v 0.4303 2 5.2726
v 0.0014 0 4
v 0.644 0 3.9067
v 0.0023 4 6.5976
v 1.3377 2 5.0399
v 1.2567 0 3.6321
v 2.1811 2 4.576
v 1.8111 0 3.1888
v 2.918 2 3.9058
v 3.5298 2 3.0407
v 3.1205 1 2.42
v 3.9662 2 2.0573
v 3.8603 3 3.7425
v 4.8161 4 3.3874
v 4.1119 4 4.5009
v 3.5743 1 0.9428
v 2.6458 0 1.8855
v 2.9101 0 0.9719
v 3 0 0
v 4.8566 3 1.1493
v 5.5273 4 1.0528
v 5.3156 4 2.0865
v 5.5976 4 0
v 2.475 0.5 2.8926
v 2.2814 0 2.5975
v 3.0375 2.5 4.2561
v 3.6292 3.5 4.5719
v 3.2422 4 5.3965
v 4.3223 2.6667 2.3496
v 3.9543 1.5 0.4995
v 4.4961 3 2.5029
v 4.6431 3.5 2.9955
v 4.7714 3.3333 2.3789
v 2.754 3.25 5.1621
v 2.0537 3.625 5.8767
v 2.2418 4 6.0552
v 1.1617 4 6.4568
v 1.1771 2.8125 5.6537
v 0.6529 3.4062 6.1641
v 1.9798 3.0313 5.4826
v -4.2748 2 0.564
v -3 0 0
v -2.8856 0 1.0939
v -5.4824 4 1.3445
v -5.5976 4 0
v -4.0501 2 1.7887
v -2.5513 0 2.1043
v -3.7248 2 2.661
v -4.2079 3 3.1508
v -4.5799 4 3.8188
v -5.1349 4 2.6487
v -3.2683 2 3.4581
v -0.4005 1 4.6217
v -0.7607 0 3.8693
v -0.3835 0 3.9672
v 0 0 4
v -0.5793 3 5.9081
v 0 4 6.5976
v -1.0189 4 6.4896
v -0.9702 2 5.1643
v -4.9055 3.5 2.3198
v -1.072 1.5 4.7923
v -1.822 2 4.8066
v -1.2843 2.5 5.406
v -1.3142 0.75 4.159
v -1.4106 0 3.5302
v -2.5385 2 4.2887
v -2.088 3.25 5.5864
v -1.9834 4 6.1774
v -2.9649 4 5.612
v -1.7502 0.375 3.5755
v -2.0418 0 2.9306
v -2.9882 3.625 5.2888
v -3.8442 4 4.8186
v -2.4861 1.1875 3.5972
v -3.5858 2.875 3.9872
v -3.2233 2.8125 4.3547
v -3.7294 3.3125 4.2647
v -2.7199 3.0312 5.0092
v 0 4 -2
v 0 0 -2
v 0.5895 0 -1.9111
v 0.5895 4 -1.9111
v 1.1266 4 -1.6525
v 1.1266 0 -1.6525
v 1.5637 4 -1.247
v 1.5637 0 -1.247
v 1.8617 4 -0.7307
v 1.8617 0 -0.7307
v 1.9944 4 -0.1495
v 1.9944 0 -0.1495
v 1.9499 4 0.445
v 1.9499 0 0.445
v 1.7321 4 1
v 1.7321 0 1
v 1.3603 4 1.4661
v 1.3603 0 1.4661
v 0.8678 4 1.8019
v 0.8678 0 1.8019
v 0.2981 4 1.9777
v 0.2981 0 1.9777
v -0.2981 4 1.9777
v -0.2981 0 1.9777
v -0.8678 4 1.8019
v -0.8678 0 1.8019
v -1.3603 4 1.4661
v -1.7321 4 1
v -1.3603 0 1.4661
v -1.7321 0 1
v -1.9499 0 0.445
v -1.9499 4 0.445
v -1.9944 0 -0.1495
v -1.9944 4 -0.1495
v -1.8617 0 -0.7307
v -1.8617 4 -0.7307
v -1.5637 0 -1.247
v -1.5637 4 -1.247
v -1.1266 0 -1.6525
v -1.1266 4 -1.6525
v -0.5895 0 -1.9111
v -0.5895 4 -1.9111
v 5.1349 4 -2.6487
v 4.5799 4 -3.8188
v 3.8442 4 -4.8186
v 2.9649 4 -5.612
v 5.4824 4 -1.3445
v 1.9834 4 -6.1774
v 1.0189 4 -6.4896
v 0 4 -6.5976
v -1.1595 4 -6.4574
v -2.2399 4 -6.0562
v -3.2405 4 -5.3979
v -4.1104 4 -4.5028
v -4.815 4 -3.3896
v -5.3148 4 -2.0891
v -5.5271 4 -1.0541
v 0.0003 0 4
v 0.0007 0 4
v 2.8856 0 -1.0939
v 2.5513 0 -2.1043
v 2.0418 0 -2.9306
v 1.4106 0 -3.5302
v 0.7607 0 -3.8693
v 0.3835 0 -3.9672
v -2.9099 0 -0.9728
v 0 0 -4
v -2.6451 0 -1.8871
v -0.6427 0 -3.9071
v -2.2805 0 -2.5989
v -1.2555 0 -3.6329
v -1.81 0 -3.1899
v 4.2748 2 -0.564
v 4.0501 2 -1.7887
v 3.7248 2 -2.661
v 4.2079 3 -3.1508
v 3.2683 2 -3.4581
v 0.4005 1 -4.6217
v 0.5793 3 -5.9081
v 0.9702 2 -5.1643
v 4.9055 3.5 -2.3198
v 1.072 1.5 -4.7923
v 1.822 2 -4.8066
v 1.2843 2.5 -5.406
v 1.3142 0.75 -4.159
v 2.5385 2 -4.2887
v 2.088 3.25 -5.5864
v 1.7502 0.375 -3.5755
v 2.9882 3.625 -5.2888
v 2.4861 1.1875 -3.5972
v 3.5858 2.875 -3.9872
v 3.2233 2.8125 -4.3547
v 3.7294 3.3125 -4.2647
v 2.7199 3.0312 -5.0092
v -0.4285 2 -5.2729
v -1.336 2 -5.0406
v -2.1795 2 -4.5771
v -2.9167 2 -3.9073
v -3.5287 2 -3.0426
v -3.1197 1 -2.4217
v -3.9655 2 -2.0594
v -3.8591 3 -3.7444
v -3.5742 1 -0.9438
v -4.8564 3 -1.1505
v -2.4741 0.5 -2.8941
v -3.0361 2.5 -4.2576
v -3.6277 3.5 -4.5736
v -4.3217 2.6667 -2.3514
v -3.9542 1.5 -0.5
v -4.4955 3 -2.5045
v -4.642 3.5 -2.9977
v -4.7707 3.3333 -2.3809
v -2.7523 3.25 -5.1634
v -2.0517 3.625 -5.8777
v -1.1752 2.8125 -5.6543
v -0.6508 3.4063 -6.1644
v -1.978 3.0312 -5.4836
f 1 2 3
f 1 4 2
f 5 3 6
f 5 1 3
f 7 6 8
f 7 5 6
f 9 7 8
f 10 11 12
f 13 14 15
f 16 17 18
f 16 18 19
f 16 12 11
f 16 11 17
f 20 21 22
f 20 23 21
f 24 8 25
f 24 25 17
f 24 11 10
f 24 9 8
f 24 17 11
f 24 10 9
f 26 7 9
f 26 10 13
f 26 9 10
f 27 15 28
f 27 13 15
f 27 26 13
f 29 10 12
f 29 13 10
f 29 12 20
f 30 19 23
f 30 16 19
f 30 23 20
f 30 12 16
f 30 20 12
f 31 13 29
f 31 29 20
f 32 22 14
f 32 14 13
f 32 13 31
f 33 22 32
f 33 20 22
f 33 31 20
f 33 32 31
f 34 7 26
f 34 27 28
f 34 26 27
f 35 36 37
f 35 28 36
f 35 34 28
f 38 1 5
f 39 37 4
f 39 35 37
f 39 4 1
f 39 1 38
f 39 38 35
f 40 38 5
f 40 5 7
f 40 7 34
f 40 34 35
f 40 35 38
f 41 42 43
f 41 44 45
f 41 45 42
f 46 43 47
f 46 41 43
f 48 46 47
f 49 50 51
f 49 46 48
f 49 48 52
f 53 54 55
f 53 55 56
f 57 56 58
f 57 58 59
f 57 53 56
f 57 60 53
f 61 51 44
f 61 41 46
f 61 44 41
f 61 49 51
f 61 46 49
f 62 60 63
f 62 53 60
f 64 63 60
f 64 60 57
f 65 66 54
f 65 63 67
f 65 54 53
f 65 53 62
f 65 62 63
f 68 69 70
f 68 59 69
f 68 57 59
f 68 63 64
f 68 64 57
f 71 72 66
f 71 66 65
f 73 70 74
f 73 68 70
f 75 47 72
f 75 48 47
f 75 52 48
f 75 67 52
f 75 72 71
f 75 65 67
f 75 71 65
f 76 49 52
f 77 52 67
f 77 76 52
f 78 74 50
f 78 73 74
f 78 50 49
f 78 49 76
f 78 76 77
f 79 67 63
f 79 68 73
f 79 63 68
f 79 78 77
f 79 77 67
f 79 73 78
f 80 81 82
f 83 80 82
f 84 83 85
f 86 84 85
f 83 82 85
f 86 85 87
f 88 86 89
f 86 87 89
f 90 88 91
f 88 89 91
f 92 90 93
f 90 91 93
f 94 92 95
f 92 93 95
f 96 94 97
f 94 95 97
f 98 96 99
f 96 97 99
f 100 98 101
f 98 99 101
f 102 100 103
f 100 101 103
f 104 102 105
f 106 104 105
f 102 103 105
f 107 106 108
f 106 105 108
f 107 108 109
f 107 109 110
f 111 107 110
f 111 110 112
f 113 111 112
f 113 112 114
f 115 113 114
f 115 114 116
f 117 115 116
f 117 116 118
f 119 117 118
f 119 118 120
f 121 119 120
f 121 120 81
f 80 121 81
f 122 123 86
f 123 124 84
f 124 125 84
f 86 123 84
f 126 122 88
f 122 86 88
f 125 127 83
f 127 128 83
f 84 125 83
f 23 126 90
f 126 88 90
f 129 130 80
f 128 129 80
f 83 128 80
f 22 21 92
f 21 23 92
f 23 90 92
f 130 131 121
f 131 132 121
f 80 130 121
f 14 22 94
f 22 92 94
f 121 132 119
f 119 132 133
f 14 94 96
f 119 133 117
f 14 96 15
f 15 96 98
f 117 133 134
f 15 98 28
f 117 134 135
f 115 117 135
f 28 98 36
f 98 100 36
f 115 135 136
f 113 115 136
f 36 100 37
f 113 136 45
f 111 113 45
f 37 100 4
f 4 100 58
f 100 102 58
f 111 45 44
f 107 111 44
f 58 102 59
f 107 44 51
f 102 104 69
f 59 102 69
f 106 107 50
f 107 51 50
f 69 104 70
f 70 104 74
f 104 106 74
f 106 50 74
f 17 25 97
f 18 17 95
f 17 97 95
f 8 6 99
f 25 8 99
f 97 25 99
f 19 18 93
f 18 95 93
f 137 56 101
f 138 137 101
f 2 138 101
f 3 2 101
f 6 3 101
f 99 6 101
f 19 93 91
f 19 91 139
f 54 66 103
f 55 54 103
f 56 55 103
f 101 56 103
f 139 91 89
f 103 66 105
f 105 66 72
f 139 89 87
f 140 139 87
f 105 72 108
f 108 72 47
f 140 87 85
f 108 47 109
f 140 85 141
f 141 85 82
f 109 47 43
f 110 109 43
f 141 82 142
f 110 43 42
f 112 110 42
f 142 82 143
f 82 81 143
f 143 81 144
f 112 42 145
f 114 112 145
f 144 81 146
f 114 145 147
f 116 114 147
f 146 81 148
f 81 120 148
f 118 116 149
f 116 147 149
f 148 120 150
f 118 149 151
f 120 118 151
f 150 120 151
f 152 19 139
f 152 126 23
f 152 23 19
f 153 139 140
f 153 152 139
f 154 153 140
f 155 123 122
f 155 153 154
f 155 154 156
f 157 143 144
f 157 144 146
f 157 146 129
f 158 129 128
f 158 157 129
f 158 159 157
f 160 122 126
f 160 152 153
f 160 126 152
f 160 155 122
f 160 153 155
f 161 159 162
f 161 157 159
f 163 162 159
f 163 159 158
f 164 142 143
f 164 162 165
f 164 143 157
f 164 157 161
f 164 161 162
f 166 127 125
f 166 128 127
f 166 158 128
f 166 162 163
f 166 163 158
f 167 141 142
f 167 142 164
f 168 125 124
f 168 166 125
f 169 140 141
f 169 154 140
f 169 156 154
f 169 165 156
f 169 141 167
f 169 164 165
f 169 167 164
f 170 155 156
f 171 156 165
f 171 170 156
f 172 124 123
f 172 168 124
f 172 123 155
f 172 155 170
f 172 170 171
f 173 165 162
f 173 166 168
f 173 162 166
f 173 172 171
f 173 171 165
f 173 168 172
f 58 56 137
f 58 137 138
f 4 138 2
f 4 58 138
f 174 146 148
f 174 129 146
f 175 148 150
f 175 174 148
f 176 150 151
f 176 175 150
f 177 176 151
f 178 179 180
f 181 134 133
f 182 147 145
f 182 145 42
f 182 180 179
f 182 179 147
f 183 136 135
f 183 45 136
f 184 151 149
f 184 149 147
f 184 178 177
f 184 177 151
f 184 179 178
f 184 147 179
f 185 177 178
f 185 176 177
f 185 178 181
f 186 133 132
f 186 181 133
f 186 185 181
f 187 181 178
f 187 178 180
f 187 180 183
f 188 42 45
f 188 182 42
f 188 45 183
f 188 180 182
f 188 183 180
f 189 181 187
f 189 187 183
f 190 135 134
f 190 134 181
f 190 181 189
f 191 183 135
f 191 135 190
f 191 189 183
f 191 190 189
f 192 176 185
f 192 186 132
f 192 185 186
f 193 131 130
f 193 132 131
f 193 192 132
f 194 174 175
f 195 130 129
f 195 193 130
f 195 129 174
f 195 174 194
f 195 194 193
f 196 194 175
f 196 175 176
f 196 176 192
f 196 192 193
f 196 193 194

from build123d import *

# Parameters (mm, degrees)
SKETCH1_RX          = 4
SKETCH1_RY          = 3
BOSS_EXTRUDE1_DEPTH = 4
BOSS_EXTRUDE1_TAPER = -33
SKETCH2_R           = 2
CUT_EXTRUDE1_DEPTH  = 10


with BuildPart() as part:
    # Sketch1 → Boss-Extrude1 (new body)
    with BuildSketch(Plane(origin=(0, 0, 0), x_dir=(1, 0, 0), z_dir=(0, 1, 0))):
        with Locations(Location((0, 0), (0, 0, 90))):
            Ellipse(SKETCH1_RX, SKETCH1_RY)
    extrude(amount=BOSS_EXTRUDE1_DEPTH, taper=BOSS_EXTRUDE1_TAPER)

    # Sketch2 → Cut-Extrude1 (cut)
    with BuildSketch(Plane.XZ):
        with Locations(Location((0, 0, 0), (0, 0, 270))):
            Circle(SKETCH2_R)
    extrude(amount=-CUT_EXTRUDE1_DEPTH, mode=Mode.SUBTRACT)


solid = part.part
